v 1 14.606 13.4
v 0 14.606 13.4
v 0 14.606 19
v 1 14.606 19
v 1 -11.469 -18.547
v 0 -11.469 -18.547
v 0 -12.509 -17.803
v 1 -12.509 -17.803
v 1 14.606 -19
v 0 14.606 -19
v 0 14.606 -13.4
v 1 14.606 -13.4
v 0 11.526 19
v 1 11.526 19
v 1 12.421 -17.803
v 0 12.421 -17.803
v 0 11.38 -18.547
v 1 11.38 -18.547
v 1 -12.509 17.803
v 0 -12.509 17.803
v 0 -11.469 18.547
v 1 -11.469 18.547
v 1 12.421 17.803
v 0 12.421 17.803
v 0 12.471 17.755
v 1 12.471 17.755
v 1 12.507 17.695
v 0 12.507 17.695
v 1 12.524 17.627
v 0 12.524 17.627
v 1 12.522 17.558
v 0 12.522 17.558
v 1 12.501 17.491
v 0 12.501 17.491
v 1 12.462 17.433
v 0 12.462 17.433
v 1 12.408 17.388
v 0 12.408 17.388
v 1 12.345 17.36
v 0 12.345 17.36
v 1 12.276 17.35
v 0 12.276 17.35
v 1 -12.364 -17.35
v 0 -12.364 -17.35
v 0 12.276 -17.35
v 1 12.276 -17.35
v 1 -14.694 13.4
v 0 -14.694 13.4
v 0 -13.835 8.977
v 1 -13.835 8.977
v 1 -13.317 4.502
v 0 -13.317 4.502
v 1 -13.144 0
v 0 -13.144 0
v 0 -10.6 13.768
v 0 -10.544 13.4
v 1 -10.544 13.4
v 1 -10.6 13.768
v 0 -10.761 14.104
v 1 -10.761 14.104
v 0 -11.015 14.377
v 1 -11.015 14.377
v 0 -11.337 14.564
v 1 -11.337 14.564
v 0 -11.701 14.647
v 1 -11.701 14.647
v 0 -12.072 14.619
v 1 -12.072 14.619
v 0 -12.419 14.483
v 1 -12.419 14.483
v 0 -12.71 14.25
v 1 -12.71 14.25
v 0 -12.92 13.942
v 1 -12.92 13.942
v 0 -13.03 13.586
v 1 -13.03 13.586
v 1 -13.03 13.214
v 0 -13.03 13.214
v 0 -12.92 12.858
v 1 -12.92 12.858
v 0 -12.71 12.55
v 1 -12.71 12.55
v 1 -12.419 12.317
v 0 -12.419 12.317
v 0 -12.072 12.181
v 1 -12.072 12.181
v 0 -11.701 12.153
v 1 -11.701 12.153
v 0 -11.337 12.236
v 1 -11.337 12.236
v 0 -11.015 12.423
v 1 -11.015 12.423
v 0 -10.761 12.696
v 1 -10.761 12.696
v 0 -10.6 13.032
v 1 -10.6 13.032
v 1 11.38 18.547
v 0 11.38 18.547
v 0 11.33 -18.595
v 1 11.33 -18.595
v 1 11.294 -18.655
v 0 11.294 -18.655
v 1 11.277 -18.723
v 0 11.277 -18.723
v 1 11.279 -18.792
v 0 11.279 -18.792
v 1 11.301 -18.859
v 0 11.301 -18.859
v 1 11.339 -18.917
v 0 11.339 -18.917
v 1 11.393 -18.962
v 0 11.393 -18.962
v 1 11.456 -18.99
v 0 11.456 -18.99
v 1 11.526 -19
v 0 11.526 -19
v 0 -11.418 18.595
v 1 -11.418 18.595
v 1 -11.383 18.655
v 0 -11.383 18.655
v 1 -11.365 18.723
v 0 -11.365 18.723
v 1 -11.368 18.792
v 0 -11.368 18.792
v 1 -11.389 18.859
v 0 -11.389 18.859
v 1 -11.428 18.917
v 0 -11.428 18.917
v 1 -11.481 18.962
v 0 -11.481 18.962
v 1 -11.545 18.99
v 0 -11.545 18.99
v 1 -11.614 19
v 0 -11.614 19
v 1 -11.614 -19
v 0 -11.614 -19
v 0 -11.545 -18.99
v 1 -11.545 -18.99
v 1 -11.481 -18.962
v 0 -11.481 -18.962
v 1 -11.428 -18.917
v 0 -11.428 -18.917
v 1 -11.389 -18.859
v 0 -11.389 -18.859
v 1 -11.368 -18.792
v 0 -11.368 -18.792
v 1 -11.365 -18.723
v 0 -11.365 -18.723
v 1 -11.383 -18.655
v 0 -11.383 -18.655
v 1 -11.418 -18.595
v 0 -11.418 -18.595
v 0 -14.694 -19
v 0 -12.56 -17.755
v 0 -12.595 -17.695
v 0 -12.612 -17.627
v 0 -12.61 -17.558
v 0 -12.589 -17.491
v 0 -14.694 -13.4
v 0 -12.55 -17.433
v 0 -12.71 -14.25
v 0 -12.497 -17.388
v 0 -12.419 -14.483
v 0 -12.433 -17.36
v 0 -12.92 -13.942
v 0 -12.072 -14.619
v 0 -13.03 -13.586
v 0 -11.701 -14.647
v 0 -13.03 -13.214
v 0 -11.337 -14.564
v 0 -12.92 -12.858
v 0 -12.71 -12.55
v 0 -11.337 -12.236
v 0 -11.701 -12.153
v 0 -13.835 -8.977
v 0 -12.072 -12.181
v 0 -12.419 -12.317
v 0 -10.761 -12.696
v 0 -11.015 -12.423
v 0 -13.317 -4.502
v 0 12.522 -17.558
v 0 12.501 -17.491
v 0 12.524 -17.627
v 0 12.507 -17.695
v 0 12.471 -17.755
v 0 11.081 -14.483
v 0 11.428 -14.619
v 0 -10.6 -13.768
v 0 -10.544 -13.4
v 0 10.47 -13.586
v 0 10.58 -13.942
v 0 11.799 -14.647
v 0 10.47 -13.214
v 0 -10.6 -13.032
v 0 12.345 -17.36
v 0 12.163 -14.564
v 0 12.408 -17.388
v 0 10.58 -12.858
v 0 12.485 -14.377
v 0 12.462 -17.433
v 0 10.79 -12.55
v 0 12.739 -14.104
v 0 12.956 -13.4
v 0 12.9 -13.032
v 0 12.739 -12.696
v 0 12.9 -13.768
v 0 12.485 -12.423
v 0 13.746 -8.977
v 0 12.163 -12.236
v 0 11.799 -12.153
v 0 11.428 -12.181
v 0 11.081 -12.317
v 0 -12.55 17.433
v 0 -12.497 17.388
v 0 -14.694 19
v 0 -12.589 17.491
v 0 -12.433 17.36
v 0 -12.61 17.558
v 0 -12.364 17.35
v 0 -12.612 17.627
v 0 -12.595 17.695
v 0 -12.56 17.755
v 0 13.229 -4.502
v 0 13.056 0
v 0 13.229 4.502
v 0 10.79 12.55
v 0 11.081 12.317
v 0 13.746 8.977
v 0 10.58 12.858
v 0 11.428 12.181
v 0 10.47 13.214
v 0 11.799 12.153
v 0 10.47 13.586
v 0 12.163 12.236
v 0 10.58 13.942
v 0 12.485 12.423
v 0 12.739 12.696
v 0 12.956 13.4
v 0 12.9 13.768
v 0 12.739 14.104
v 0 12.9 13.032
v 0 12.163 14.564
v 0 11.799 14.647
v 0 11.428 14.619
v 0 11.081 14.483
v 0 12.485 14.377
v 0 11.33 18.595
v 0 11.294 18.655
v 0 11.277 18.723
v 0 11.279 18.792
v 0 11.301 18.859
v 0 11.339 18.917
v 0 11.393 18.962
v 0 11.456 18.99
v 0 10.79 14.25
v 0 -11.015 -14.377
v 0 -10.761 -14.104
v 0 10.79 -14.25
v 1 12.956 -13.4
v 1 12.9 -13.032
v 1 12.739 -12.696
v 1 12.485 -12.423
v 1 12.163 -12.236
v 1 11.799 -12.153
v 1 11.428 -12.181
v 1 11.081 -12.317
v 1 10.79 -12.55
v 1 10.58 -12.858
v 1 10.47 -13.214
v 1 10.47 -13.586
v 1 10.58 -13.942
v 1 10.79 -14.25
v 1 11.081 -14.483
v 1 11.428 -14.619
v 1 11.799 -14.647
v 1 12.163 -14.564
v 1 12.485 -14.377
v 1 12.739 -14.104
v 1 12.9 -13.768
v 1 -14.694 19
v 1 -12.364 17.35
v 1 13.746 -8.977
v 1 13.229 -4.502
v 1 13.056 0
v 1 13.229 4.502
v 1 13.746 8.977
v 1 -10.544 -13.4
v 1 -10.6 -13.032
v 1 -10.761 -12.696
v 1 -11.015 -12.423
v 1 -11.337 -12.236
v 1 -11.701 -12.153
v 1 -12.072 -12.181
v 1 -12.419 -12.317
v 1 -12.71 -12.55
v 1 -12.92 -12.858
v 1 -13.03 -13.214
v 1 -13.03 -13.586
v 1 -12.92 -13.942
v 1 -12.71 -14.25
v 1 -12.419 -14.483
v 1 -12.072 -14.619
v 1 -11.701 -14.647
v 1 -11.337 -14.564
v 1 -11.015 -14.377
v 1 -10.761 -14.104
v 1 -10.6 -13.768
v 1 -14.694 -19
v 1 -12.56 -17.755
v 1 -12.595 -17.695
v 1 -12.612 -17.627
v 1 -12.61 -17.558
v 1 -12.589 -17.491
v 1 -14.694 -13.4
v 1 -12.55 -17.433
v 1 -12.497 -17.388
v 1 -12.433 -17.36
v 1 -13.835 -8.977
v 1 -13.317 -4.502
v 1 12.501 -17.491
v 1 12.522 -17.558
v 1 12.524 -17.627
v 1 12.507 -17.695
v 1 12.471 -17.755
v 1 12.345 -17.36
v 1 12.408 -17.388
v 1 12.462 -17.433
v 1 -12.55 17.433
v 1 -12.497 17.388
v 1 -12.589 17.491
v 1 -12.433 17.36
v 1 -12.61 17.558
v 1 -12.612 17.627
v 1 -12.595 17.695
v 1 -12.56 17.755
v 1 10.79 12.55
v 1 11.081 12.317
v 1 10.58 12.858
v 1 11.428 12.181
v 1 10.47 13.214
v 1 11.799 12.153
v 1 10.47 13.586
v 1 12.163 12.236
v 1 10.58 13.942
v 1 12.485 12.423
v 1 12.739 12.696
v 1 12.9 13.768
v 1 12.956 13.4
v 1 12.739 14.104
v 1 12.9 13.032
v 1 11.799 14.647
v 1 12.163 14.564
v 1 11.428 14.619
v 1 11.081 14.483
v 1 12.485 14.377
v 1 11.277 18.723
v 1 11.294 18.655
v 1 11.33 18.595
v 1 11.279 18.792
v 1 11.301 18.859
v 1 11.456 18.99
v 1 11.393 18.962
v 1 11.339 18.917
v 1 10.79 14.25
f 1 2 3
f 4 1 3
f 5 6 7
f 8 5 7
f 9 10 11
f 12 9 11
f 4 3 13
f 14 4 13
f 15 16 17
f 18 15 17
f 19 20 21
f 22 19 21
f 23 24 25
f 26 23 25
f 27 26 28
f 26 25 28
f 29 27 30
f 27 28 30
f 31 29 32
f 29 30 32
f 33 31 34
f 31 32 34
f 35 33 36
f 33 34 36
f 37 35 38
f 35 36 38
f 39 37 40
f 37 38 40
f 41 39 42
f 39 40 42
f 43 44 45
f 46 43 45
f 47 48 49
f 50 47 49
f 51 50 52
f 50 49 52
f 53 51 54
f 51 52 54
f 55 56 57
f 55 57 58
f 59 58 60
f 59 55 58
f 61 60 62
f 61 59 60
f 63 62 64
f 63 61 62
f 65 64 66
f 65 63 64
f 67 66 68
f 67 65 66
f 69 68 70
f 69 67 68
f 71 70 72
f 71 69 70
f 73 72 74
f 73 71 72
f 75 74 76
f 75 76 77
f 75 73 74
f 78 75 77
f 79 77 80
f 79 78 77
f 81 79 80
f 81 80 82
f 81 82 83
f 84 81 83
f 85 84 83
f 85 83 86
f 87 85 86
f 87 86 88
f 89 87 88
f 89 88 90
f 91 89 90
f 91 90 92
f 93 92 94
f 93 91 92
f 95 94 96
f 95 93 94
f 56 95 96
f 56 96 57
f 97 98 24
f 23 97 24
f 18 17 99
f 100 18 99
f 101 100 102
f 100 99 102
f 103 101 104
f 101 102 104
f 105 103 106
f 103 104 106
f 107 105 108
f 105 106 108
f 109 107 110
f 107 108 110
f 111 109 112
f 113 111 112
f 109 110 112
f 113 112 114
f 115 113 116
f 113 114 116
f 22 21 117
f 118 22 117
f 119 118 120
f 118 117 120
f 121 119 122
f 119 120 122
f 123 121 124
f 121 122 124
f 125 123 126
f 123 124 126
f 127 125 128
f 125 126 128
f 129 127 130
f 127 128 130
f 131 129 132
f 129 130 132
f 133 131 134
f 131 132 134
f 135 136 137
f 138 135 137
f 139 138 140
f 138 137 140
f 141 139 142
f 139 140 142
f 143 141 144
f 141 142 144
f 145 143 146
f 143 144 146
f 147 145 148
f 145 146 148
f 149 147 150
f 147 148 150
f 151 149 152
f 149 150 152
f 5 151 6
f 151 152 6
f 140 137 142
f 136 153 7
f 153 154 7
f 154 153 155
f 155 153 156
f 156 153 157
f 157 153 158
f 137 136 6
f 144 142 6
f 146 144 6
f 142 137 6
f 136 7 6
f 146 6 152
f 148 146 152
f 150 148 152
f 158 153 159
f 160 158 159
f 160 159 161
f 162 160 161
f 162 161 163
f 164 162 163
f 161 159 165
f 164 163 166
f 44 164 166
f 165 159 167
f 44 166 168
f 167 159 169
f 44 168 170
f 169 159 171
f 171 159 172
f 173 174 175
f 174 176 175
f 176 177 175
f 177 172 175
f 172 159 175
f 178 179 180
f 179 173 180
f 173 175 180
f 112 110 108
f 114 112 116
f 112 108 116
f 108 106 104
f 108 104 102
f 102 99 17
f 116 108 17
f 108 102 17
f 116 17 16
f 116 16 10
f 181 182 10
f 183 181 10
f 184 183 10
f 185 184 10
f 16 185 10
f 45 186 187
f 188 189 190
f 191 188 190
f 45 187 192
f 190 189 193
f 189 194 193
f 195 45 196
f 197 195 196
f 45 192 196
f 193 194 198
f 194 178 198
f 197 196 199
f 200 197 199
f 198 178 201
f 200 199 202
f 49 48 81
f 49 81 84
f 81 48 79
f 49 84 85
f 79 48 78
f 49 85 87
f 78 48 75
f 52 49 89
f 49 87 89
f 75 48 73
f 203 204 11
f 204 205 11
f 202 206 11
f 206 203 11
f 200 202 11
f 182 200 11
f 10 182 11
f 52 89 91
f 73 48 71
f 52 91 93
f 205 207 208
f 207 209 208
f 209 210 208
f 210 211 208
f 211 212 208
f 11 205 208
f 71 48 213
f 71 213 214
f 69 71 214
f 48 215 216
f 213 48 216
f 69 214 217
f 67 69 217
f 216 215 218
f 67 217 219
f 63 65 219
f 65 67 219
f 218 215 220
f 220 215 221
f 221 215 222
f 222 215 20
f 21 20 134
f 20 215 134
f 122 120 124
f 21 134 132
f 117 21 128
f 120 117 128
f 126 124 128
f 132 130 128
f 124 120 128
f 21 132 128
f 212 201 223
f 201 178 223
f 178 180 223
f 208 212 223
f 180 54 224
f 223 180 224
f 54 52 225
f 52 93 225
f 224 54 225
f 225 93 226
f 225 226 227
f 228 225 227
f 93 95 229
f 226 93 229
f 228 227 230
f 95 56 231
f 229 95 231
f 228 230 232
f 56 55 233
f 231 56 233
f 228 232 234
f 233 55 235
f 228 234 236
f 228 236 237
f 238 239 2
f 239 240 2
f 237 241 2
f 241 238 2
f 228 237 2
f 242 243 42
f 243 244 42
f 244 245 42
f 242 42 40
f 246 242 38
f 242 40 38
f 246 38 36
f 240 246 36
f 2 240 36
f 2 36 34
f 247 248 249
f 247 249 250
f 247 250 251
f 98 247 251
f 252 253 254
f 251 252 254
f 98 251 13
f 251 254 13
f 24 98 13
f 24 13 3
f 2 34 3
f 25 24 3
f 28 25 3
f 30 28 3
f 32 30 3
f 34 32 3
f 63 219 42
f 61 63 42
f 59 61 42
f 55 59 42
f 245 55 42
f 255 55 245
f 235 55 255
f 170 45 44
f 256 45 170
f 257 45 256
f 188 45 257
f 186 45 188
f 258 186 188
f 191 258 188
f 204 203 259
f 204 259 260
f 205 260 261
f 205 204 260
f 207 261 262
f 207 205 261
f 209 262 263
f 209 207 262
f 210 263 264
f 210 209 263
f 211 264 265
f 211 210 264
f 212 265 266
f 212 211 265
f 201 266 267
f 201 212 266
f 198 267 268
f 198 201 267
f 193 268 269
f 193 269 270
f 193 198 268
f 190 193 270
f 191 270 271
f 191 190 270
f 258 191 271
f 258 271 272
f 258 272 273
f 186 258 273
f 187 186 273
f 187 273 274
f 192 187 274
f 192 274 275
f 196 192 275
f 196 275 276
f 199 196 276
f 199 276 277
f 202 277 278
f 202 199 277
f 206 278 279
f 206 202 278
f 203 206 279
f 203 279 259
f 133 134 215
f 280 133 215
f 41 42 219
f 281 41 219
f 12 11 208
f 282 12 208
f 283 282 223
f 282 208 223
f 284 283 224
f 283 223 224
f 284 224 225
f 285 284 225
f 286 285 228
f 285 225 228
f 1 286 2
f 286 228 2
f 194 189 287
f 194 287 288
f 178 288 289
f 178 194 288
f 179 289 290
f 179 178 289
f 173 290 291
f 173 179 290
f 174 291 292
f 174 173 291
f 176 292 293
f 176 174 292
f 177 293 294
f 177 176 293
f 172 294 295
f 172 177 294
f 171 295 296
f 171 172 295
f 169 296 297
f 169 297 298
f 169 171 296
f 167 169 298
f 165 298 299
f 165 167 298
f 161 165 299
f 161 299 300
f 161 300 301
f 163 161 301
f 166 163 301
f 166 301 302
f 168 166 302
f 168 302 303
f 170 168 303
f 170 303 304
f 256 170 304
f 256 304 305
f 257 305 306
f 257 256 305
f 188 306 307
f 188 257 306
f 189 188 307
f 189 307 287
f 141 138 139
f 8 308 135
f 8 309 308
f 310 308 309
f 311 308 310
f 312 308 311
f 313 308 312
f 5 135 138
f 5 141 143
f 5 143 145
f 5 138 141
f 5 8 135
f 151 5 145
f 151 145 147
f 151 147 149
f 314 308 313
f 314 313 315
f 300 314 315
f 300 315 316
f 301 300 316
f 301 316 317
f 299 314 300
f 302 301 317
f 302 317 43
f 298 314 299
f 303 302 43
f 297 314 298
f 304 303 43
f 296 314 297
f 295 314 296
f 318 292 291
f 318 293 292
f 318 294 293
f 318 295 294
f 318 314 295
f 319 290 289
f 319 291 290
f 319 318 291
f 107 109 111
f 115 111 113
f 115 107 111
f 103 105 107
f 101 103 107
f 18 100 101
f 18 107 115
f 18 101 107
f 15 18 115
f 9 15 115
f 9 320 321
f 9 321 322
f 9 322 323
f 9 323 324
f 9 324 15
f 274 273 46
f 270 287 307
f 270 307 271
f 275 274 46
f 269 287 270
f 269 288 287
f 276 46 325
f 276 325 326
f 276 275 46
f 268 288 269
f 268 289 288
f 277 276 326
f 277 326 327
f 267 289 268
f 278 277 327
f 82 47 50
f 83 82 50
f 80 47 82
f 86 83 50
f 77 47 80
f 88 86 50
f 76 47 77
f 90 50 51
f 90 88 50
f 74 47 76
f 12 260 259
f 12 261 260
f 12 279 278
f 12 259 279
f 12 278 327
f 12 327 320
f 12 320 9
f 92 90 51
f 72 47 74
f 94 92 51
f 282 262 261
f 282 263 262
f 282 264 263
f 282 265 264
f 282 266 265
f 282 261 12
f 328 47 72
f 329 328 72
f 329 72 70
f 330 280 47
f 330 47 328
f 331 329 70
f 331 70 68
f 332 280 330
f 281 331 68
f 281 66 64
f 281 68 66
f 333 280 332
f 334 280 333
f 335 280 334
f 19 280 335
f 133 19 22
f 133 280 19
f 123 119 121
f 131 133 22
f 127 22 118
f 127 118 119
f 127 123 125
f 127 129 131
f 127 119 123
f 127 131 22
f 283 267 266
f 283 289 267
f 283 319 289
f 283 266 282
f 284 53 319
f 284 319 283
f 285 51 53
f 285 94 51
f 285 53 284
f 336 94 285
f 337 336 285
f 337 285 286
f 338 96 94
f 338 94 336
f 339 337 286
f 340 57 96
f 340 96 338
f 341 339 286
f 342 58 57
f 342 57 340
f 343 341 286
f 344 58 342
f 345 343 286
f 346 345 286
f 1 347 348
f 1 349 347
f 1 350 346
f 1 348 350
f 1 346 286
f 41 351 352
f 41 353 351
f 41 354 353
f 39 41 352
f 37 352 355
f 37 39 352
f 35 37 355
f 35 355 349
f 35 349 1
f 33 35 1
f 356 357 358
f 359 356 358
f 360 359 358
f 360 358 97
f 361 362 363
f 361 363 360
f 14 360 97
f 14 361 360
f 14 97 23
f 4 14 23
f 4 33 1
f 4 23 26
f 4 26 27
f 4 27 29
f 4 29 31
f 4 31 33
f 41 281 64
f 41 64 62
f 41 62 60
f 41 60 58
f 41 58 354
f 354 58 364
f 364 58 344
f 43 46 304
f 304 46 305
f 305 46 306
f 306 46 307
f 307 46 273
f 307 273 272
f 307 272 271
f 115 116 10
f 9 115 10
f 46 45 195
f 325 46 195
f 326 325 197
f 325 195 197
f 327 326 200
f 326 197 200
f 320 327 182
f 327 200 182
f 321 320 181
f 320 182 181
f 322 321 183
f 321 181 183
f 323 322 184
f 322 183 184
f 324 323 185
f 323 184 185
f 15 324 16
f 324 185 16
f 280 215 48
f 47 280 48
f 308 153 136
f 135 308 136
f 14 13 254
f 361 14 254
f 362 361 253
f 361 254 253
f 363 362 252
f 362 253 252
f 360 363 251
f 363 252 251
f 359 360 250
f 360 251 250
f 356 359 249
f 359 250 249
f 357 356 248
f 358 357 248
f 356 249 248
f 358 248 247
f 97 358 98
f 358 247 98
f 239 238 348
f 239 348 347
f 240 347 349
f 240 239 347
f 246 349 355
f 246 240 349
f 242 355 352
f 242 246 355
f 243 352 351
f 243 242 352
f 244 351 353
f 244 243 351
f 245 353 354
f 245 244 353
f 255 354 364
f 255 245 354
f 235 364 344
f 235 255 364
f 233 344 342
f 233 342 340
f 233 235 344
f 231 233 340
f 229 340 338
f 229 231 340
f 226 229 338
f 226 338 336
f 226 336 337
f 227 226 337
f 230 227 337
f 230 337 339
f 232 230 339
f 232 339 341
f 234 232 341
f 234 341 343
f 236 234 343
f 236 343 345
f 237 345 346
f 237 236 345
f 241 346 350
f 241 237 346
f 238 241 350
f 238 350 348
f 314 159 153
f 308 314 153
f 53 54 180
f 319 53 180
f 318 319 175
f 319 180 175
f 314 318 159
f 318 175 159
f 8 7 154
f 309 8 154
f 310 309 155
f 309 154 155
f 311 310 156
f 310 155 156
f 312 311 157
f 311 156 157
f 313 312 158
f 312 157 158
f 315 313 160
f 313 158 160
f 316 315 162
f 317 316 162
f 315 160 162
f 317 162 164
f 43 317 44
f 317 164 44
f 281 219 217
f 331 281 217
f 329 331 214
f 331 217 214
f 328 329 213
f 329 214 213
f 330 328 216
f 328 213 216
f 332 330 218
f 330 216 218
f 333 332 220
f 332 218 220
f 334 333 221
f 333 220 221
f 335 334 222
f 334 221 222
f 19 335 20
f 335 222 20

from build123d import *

# Parameters (mm, degrees)
F1_DEPTH = 1
F2_R     = 1.25
F3_DEPTH = 1


with BuildPart() as f1:
    # F0 (on Right) → F1 (new body)
    with BuildSketch(Plane.YZ):
        with BuildLine():
            Line((12.275582, 17.35), (-0.044173, 17.35))
            Line((-0.044173, 17.35), (-12.363928, 17.35))
            ThreePointArc((-12.363928, 17.35), (-12.602005, 17.523717), (-12.509218, 17.803447))
            Line((-12.509218, 17.803447), (-11.468659, 18.546553))
            ThreePointArc((-11.468659, 18.546553), (-11.375872, 18.826283), (-11.613949, 19))
            Line((-11.613949, 19), (-14.694173, 19))
            Line((-14.694173, 19), (-14.694173, 13.4))
            ThreePointArc((-14.694173, 13.4), (-13.532961, 6.744674), (-13.144173, 0))
            ThreePointArc((-13.144173, 0), (-13.532961, -6.744674), (-14.694173, -13.4))
            Line((-14.694173, -13.4), (-14.694173, -19))
            Line((-14.694173, -19), (-11.613949, -19))
            ThreePointArc((-11.613949, -19), (-11.375872, -18.826283), (-11.468659, -18.546553))
            Line((-11.468659, -18.546553), (-12.509218, -17.803447))
            ThreePointArc((-12.509218, -17.803447), (-12.602005, -17.523717), (-12.363928, -17.35))
            Line((-12.363928, -17.35), (-0.044173, -17.35))
            Line((-0.044173, -17.35), (12.275582, -17.35))
            ThreePointArc((12.275582, -17.35), (12.51366, -17.523717), (12.420872, -17.803447))
            Line((12.420872, -17.803447), (11.380313, -18.546553))
            ThreePointArc((11.380313, -18.546553), (11.287526, -18.826283), (11.525603, -19))
            Line((11.525603, -19), (14.605827, -19))
            Line((14.605827, -19), (14.605827, -13.4))
            ThreePointArc((14.605827, -13.4), (13.444615, -6.744674), (13.055827, 0))
            ThreePointArc((13.055827, 0), (13.444615, 6.744674), (14.605827, 13.4))
            Line((14.605827, 13.4), (14.605827, 19))
            Line((14.605827, 19), (11.525603, 19))
            ThreePointArc((11.525603, 19), (11.287526, 18.826283), (11.380313, 18.546553))
            Line((11.380313, 18.546553), (12.420872, 17.803447))
            ThreePointArc((12.420872, 17.803447), (12.51366, 17.523717), (12.275582, 17.35))
        make_face()
    extrude(amount=F1_DEPTH)

    # F2 (on face) → F3 (cut, through all)
    with BuildSketch(Plane.YZ):
        with Locations((11.705827, 13.4)):
            Circle(F2_R)
        with Locations((-11.794173, 13.4)):
            Circle(F2_R)
        with Locations((-11.794173, -13.4)):
            Circle(F2_R)
        with Locations((11.705827, -13.4)):
            Circle(F2_R)
    extrude(amount=F3_DEPTH, mode=Mode.SUBTRACT)


solid = f1.part
